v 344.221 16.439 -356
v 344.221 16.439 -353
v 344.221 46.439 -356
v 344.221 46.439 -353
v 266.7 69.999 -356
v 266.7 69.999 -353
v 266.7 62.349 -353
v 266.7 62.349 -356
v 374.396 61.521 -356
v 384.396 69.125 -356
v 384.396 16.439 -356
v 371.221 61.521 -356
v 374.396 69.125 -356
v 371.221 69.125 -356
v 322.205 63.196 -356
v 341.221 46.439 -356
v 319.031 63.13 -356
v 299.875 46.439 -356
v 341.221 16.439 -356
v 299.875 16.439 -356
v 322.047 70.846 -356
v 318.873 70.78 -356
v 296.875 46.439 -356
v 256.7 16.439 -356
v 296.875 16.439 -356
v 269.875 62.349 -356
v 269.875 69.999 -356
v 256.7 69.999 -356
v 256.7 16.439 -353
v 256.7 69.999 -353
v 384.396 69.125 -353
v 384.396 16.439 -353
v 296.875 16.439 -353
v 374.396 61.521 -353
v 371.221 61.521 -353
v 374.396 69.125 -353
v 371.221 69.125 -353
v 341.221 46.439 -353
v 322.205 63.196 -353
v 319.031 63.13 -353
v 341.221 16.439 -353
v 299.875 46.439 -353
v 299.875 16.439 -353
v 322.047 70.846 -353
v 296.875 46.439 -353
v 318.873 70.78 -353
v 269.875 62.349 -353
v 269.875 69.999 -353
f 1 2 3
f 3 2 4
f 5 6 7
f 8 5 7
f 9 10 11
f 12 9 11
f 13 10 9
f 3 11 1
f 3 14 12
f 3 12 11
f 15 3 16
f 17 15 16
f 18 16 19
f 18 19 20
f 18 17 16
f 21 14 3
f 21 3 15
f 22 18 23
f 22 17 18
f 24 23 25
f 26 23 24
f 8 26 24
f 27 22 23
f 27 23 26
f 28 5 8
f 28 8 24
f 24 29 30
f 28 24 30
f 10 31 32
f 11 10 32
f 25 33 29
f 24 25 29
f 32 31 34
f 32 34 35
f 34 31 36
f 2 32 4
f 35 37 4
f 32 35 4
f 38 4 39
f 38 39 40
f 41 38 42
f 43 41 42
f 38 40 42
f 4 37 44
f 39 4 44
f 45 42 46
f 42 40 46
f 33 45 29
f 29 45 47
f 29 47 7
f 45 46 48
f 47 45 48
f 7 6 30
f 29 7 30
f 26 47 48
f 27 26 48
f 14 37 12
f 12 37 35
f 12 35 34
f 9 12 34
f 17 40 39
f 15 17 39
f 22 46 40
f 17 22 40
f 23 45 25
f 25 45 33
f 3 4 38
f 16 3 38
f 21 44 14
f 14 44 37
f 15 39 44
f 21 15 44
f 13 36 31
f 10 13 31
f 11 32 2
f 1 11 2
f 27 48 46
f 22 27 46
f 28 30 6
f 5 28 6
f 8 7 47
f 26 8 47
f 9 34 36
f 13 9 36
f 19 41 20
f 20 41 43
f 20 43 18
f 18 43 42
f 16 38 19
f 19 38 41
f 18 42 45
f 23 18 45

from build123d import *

# Parameters (mm, degrees)
BOSS_EXTRUDE1_DEPTH = 3


with BuildPart() as part:
    # Sketch2 → Boss-Extrude1 (new body)
    with BuildSketch(Plane.XY.offset(-353)):
        Polygon((371.221, 61.521478107), (374.396, 61.521478107), (374.396, 69.124950745), (384.396, 69.124950745), (384.396, 16.438825445), (344.221, 16.438825445), (344.221, 46.438825445), (341.221, 46.438825445), (341.221, 16.438825445), (299.875, 16.438825445), (299.875, 46.438825445), (296.875, 46.438825445), (296.875, 16.438825445), (256.7, 16.438825445), (256.7, 69.999273471), (266.7, 69.999273471), (266.7, 62.349211745), (269.875, 62.349211745), (269.875, 69.999275879), (318.872542602, 70.779885056), (319.031094476, 63.13005689), (322.205416715, 63.195722676), (322.046864787, 70.845553451), (371.221, 69.124947668), align=None)
    extrude(amount=-BOSS_EXTRUDE1_DEPTH)


solid = part.part
